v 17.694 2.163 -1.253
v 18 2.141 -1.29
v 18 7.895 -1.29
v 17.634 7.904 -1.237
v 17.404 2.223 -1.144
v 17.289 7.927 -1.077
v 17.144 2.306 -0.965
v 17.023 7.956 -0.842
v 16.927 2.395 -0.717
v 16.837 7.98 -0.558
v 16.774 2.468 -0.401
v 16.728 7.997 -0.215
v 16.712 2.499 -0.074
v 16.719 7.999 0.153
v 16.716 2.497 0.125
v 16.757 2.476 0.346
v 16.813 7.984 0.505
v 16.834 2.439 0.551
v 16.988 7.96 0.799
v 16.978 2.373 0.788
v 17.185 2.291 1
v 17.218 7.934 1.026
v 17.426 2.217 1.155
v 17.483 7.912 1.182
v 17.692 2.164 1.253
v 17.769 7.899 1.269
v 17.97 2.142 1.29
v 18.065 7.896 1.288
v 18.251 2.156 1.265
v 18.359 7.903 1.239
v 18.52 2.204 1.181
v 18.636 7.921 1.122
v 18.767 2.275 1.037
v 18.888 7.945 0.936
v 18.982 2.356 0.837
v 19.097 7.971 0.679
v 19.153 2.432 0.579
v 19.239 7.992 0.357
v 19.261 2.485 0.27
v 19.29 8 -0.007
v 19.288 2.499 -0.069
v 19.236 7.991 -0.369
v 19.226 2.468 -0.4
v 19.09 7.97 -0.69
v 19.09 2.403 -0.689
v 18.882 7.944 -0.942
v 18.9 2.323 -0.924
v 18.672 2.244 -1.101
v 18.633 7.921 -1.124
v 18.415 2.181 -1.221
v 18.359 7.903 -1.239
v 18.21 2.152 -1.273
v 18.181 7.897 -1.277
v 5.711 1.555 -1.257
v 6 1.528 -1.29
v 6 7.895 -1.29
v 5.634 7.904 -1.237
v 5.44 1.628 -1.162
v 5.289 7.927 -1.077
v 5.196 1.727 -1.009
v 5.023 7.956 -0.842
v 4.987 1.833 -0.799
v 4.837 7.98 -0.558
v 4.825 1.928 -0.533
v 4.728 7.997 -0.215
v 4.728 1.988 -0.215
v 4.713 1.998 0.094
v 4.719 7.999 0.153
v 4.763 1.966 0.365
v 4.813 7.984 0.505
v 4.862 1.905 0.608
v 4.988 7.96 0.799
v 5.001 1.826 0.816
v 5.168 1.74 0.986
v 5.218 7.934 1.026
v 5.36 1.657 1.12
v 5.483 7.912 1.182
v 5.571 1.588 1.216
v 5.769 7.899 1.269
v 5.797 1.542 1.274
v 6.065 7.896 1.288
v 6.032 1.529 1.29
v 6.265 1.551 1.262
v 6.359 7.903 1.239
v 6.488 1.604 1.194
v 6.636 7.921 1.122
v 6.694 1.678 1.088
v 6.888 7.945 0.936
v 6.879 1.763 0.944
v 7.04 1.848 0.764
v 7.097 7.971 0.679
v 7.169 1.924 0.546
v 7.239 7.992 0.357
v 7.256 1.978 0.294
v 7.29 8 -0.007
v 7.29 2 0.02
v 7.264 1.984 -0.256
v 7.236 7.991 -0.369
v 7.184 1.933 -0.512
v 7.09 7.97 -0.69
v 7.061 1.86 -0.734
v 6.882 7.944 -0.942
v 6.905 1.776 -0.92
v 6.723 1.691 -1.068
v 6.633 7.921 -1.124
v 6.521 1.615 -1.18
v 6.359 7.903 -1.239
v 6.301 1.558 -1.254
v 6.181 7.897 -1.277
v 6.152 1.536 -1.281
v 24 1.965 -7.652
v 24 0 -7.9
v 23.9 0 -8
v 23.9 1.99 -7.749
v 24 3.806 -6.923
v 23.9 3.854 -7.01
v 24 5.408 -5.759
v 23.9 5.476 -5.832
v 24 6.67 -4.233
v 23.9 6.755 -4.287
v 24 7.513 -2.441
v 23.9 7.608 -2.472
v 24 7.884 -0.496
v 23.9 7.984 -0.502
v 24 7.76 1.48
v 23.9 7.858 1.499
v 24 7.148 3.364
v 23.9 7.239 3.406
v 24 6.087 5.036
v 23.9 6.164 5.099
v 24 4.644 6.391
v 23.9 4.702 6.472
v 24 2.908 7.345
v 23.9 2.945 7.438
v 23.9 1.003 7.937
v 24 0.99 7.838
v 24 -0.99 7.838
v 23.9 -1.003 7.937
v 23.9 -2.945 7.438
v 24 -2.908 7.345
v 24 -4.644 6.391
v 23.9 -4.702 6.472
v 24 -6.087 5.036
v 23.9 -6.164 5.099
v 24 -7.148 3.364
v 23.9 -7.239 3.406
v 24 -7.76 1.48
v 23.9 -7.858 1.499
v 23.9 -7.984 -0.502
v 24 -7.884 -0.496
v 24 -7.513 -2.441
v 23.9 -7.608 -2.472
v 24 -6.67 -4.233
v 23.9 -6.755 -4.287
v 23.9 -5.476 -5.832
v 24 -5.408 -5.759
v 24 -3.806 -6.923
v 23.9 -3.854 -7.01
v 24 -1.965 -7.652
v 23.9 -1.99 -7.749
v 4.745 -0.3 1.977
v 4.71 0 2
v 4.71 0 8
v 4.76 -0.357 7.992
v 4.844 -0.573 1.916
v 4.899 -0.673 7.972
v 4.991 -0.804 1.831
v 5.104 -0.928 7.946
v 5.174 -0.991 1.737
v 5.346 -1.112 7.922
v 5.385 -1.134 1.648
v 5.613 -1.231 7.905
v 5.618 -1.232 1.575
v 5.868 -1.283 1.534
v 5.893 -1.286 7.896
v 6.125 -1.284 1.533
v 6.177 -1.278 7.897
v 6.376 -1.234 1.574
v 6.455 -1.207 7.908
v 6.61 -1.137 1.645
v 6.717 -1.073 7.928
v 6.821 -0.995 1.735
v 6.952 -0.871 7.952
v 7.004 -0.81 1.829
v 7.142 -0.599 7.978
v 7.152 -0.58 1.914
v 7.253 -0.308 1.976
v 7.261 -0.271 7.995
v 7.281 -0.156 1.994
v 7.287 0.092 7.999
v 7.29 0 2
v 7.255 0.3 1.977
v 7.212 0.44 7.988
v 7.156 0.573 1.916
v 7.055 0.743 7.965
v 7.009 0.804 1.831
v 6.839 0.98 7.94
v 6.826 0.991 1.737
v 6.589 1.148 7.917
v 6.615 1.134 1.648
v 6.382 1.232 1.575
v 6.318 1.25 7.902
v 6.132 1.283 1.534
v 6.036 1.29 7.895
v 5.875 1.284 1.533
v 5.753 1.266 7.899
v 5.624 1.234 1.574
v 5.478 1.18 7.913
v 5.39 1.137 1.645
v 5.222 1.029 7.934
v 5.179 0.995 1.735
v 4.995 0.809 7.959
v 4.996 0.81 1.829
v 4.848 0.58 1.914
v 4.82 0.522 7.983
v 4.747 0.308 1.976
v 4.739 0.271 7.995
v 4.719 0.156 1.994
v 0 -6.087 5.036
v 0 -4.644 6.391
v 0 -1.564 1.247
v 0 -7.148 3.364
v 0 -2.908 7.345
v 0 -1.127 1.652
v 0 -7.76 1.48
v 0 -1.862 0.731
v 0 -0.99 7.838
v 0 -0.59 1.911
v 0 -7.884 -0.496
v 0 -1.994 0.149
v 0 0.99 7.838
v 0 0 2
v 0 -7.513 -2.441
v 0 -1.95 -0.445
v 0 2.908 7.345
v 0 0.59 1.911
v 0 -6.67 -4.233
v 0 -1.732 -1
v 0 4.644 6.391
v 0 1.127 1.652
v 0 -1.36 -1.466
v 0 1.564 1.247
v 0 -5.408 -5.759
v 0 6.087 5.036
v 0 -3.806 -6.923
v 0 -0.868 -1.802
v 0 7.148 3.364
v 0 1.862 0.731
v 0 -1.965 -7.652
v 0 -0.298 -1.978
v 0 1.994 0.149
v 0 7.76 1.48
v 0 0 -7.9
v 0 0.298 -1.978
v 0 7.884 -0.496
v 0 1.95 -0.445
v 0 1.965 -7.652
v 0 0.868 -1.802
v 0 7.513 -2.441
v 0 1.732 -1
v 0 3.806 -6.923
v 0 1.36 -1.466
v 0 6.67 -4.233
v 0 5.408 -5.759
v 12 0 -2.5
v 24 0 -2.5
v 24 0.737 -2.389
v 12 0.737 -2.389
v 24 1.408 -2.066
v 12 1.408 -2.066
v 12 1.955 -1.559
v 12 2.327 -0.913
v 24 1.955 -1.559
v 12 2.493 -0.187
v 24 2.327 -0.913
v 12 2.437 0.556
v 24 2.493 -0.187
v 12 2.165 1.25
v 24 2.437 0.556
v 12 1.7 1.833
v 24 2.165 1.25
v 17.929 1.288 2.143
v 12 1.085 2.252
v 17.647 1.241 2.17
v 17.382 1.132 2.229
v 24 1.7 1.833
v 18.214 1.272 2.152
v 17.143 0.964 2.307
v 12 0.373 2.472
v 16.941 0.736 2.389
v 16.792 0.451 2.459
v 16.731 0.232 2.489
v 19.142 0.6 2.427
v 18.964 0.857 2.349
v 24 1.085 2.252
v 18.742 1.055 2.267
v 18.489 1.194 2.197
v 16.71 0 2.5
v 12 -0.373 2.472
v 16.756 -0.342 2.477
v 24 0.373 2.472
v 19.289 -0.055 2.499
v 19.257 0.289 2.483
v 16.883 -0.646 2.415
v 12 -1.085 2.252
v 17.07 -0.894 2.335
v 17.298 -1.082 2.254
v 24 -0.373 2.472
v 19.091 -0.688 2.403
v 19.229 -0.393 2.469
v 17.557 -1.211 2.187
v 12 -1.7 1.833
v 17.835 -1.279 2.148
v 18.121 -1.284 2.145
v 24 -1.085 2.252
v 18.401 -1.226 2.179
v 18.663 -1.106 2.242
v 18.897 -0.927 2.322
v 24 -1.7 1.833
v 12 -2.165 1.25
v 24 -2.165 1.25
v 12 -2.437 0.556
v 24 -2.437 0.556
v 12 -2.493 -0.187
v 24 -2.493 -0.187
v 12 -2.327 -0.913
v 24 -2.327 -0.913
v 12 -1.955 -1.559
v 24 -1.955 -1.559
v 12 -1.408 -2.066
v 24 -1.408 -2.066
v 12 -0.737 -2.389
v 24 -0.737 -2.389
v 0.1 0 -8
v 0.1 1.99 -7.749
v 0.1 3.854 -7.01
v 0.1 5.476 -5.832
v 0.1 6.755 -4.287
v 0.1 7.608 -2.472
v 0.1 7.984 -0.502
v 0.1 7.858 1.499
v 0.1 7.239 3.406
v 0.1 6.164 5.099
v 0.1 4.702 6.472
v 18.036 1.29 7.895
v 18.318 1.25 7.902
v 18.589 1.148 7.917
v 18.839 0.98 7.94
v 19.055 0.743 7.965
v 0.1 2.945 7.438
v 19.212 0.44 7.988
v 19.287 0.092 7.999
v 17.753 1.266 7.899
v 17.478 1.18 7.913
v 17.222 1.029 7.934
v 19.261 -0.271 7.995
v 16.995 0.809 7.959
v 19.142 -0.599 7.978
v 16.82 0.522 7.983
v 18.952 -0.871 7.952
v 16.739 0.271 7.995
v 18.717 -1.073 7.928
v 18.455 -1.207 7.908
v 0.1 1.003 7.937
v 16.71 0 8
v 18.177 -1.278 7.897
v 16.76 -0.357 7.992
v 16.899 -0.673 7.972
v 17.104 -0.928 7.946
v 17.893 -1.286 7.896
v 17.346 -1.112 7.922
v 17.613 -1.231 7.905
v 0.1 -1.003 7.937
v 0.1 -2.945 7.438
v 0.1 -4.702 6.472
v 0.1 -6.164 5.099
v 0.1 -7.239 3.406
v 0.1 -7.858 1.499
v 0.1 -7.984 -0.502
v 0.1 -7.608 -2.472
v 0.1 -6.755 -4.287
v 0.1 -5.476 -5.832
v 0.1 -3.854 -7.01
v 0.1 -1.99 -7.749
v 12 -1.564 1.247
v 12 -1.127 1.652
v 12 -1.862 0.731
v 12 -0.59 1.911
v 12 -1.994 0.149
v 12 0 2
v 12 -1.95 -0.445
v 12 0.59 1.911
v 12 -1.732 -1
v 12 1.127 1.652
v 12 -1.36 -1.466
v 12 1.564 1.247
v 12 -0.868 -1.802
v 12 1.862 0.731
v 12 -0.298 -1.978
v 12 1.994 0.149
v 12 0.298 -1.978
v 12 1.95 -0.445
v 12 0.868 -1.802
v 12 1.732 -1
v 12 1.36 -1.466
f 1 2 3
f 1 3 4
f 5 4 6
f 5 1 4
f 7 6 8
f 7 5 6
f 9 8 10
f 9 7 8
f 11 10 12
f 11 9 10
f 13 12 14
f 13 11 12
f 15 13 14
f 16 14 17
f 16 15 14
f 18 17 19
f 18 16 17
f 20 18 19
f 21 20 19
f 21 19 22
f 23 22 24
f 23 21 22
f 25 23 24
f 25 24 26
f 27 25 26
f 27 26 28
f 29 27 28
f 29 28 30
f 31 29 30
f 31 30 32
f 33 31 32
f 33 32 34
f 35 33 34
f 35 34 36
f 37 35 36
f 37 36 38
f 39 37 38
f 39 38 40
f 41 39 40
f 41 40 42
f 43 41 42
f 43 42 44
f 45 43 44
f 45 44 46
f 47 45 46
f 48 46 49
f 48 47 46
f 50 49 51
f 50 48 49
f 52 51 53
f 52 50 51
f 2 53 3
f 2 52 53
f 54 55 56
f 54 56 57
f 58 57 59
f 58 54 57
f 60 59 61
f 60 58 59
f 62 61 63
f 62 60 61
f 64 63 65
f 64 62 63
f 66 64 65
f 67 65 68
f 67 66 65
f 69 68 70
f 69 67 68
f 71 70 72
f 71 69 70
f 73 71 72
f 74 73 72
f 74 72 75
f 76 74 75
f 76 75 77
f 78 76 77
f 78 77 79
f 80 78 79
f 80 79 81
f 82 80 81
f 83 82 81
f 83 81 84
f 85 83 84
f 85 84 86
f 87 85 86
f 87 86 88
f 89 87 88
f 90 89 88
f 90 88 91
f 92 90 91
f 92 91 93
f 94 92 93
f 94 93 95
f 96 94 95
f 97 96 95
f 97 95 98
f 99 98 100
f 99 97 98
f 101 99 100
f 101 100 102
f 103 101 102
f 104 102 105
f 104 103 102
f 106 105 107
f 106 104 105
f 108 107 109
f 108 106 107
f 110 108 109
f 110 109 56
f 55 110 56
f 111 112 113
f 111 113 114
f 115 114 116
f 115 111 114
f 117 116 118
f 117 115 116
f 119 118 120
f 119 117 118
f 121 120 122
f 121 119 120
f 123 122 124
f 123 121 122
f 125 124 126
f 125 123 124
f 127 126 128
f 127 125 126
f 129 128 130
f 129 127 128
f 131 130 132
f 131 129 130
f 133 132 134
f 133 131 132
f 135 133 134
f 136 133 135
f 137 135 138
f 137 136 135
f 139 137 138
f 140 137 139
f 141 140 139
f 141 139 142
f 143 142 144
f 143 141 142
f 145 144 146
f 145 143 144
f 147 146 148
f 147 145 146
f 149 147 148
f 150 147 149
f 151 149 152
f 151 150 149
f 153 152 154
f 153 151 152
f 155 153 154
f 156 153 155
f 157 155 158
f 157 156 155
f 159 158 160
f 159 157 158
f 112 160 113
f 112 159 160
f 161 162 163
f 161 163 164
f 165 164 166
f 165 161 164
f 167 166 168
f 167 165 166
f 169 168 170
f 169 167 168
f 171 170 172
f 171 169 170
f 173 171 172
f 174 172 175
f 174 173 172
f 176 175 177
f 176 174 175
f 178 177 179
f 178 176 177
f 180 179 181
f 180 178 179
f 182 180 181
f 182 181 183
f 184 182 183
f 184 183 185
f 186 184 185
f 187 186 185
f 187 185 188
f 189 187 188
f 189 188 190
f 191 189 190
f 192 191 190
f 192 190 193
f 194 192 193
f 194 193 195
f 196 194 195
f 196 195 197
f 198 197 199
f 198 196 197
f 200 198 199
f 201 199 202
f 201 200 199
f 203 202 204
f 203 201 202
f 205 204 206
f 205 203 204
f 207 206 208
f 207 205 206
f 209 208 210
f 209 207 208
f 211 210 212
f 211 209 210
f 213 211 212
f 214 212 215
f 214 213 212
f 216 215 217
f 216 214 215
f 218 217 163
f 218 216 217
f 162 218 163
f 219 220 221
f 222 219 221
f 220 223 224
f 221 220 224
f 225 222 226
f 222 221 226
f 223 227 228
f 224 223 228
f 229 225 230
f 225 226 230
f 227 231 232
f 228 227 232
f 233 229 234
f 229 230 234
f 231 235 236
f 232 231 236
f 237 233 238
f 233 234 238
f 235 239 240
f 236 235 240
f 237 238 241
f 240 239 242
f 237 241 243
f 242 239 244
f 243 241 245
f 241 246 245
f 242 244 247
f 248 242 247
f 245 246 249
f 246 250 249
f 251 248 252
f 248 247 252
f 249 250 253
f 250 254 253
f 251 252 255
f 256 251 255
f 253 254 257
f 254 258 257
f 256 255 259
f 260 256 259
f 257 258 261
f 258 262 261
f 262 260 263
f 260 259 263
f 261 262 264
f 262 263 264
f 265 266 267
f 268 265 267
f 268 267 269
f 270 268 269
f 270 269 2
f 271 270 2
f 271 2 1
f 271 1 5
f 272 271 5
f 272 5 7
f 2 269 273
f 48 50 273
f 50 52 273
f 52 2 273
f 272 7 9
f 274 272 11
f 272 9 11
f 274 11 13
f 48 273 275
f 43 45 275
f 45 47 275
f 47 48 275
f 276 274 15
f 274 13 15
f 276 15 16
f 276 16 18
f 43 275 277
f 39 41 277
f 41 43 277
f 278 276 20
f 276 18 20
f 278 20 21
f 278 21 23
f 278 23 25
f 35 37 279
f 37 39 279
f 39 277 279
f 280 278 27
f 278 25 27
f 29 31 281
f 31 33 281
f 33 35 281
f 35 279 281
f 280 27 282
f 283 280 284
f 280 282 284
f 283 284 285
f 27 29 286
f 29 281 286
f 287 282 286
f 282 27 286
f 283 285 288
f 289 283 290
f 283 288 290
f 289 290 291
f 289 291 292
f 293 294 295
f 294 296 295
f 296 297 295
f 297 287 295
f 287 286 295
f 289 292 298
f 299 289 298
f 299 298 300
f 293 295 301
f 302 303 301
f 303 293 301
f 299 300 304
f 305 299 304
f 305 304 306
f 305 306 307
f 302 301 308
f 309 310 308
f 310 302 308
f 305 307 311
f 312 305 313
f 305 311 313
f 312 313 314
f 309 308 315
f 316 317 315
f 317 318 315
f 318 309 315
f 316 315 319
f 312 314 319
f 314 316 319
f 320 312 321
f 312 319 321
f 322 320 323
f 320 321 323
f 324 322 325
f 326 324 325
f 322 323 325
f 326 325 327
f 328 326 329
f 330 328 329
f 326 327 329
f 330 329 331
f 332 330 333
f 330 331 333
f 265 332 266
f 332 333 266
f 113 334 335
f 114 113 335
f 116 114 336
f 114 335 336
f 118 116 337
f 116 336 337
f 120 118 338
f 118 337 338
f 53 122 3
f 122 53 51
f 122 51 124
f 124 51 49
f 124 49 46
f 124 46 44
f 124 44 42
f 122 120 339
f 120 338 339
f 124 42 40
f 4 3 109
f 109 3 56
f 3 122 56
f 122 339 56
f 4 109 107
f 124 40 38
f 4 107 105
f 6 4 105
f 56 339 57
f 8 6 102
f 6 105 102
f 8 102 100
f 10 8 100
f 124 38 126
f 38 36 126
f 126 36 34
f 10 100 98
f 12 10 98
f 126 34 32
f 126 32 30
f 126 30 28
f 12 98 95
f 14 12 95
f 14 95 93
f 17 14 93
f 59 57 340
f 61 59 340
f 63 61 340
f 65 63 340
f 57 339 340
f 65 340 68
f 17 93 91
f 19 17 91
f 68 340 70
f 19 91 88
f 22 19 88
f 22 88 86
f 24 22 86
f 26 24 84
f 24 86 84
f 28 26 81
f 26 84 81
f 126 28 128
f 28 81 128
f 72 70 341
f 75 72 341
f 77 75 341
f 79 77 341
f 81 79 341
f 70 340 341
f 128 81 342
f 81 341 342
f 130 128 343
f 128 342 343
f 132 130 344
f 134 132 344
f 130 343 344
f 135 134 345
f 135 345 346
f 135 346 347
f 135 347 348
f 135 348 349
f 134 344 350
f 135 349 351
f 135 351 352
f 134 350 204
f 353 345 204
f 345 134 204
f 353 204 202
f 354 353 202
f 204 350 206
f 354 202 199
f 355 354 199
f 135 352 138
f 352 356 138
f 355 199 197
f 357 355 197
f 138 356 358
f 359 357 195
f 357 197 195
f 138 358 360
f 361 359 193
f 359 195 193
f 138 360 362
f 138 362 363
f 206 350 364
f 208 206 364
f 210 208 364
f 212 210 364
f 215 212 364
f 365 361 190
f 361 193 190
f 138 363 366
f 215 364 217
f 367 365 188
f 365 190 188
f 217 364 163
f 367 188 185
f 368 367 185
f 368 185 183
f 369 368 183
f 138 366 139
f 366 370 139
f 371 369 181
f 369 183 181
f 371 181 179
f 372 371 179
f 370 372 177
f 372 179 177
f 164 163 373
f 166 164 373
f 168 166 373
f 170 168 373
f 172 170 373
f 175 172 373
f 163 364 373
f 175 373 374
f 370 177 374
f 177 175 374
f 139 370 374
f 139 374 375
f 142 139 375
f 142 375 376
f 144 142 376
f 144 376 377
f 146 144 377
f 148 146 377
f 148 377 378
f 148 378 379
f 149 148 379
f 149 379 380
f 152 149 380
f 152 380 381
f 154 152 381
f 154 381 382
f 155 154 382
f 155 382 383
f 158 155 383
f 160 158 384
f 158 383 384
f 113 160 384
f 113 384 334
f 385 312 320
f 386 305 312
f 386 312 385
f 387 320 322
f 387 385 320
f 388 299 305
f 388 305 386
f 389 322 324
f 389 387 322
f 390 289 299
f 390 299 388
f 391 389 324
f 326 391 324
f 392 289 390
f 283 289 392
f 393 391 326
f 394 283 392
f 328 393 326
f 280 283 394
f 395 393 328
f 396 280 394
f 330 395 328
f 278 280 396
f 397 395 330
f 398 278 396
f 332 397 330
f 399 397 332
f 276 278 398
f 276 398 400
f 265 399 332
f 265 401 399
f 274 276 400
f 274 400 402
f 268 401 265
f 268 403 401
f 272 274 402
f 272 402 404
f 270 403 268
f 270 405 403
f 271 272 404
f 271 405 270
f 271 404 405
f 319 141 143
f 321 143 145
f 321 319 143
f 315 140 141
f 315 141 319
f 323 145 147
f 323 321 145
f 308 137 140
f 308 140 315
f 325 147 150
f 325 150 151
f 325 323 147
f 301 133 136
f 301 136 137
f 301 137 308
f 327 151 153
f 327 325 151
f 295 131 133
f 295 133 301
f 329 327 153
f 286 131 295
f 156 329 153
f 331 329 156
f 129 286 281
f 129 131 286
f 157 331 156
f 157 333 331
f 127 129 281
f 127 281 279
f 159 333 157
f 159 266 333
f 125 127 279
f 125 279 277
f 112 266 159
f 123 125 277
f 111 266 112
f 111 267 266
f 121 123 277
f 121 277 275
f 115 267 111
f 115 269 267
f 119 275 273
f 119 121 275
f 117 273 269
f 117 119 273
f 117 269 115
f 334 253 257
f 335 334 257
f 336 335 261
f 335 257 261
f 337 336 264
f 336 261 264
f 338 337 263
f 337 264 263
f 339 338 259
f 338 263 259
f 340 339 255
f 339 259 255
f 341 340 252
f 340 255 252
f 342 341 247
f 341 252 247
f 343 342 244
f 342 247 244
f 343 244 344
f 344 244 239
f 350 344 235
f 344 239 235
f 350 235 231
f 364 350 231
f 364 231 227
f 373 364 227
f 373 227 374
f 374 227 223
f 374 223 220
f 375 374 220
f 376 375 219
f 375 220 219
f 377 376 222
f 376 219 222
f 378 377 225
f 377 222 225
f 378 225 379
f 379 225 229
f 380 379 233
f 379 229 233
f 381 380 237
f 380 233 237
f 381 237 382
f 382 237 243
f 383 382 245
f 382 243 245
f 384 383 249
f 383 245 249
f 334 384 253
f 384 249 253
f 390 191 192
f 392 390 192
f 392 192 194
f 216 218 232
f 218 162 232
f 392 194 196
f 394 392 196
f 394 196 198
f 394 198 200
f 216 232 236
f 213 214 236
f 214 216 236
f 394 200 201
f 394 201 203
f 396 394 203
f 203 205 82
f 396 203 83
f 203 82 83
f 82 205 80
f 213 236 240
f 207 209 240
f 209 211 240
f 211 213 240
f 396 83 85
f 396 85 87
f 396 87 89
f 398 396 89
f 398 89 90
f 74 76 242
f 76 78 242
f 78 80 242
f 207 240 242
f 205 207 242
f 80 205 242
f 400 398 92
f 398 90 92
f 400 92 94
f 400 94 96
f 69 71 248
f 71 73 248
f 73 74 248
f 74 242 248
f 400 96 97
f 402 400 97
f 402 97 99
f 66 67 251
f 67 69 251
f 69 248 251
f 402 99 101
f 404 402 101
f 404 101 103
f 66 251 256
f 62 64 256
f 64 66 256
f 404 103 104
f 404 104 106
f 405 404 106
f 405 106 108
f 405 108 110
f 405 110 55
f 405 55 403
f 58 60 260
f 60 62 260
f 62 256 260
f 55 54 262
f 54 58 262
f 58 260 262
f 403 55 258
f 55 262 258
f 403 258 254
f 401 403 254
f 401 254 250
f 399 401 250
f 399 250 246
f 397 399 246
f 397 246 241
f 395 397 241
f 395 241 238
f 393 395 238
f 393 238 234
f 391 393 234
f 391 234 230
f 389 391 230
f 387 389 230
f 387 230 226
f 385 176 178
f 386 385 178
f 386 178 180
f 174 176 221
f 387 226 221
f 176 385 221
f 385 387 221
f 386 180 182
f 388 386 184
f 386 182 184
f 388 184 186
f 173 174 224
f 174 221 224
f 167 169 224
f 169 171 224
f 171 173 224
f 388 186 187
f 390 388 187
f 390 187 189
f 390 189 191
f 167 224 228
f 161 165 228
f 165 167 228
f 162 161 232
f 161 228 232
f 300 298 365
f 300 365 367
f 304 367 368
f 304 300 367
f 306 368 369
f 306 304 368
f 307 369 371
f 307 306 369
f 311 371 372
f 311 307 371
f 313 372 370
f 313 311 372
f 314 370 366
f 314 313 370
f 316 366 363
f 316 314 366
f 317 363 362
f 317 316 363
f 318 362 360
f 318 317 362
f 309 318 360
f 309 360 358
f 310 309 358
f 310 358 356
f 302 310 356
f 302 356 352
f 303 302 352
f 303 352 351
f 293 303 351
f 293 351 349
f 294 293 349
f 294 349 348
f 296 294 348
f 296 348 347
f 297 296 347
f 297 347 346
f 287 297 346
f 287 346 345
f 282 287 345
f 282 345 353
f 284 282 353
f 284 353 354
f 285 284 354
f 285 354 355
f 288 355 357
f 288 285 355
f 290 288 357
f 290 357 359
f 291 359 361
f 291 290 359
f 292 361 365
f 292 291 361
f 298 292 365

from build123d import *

# Parameters (mm, degrees)
SKETCH_1_R               = 8
EXTRUDE_1_DEPTH          = 24
SKETCH_2_R               = 2
CUT_EXTRUDE_1_DEPTH      = 12
SKETCH_3_R               = 2.5
CUT_EXTRUDE_2_DEPTH      = 12
CUT_EXTRUDE_3_REACH      = 28.533
CUT_EXTRUDE_3_END_RADIUS = 8
SKETCH_4_R               = 1.29
CUT_EXTRUDE_4_REACH      = 28.533
CUT_EXTRUDE_4_END_RADIUS = 8
SKETCH_5_R               = 1.29
CHAMFER_1_SIZE           = 0.1


with BuildPart() as part:
    # 草图1 → 凸台-拉伸1 (new body)
    with BuildSketch(Plane(origin=(0, 0, 0), x_dir=(0, 0, -1), z_dir=(1, 0, 0))):
        Circle(SKETCH_1_R)
    extrude(amount=EXTRUDE_1_DEPTH)

    # 草图2 → 切除-拉伸1 (cut)
    with BuildSketch(Plane.ZY):
        Circle(SKETCH_2_R)
    extrude(amount=-CUT_EXTRUDE_1_DEPTH, mode=Mode.SUBTRACT)

    # 草图3 → 切除-拉伸2 (cut)
    with BuildSketch(Plane(origin=(24, 0, 0), x_dir=(0, 0, -1), z_dir=(1, 0, 0))):
        Circle(SKETCH_3_R)
    extrude(amount=-CUT_EXTRUDE_2_DEPTH, mode=Mode.SUBTRACT)

    # 切除-拉伸3: up to this cylinder (the profile starts inside it)
    cut_extrude_3_end = Plane(origin=(12, 0, 0), z_dir=(-1, 0, 0)) * Cylinder(CUT_EXTRUDE_3_END_RADIUS, 86.066, mode=Mode.PRIVATE)
    # 草图4 → 切除-拉伸3 (cut, up to the surface)
    with BuildSketch(Plane(origin=(0, 0, 0), x_dir=(1, 0, 0), z_dir=(0, 1, 0)), mode=Mode.PRIVATE) as cut_extrude_3_sk1:
        with Locations(Location((6, 0, 0), (0, 0, 90))):
            Circle(SKETCH_4_R)
    cut_extrude_3_tool1 = extrude(cut_extrude_3_sk1.sketch, amount=CUT_EXTRUDE_3_REACH, mode=Mode.PRIVATE) & cut_extrude_3_end
    add(cut_extrude_3_tool1.solids().sort_by_distance((6, 0, 0))[0], mode=Mode.SUBTRACT)
    # 草图4 → 切除-拉伸3 (cut, up to the surface)
    with BuildSketch(Plane(origin=(0, 0, 0), x_dir=(1, 0, 0), z_dir=(0, 1, 0)), mode=Mode.PRIVATE) as cut_extrude_3_sk2:
        with Locations(Location((18, 0, 0), (0, 0, 90))):
            Circle(SKETCH_4_R)
    cut_extrude_3_tool2 = extrude(cut_extrude_3_sk2.sketch, amount=CUT_EXTRUDE_3_REACH, mode=Mode.PRIVATE) & cut_extrude_3_end
    add(cut_extrude_3_tool2.solids().sort_by_distance((18, 0, 0))[0], mode=Mode.SUBTRACT)

    # 切除-拉伸4: up to this cylinder (the profile starts inside it)
    cut_extrude_4_end = Plane(origin=(12, 0, 0), z_dir=(-1, 0, 0)) * Cylinder(CUT_EXTRUDE_4_END_RADIUS, 86.066, mode=Mode.PRIVATE)
    # 草图5 → 切除-拉伸4 (cut, up to the surface)
    with BuildSketch(Plane.XY, mode=Mode.PRIVATE) as cut_extrude_4_sk1:
        with Locations(Location((18, 0, 0), (0, 0, 180))):
            Circle(SKETCH_5_R)
    cut_extrude_4_tool1 = extrude(cut_extrude_4_sk1.sketch, amount=CUT_EXTRUDE_4_REACH, mode=Mode.PRIVATE) & cut_extrude_4_end
    add(cut_extrude_4_tool1.solids().sort_by_distance((18, 0, 0))[0], mode=Mode.SUBTRACT)
    # 草图5 → 切除-拉伸4 (cut, up to the surface)
    with BuildSketch(Plane.XY, mode=Mode.PRIVATE) as cut_extrude_4_sk2:
        with Locations(Location((6, 0, 0), (0, 0, 180))):
            Circle(SKETCH_5_R)
    cut_extrude_4_tool2 = extrude(cut_extrude_4_sk2.sketch, amount=CUT_EXTRUDE_4_REACH, mode=Mode.PRIVATE) & cut_extrude_4_end
    add(cut_extrude_4_tool2.solids().sort_by_distance((6, 0, 0))[0], mode=Mode.SUBTRACT)

    # 倒角1
    chamfer_1_edges = [part.edges().sort_by_distance(p)[0] for p in [
        (0, 0, 8),
        (24, 0, 8),
    ]]
    chamfer(chamfer_1_edges, length=CHAMFER_1_SIZE)


solid = part.part
